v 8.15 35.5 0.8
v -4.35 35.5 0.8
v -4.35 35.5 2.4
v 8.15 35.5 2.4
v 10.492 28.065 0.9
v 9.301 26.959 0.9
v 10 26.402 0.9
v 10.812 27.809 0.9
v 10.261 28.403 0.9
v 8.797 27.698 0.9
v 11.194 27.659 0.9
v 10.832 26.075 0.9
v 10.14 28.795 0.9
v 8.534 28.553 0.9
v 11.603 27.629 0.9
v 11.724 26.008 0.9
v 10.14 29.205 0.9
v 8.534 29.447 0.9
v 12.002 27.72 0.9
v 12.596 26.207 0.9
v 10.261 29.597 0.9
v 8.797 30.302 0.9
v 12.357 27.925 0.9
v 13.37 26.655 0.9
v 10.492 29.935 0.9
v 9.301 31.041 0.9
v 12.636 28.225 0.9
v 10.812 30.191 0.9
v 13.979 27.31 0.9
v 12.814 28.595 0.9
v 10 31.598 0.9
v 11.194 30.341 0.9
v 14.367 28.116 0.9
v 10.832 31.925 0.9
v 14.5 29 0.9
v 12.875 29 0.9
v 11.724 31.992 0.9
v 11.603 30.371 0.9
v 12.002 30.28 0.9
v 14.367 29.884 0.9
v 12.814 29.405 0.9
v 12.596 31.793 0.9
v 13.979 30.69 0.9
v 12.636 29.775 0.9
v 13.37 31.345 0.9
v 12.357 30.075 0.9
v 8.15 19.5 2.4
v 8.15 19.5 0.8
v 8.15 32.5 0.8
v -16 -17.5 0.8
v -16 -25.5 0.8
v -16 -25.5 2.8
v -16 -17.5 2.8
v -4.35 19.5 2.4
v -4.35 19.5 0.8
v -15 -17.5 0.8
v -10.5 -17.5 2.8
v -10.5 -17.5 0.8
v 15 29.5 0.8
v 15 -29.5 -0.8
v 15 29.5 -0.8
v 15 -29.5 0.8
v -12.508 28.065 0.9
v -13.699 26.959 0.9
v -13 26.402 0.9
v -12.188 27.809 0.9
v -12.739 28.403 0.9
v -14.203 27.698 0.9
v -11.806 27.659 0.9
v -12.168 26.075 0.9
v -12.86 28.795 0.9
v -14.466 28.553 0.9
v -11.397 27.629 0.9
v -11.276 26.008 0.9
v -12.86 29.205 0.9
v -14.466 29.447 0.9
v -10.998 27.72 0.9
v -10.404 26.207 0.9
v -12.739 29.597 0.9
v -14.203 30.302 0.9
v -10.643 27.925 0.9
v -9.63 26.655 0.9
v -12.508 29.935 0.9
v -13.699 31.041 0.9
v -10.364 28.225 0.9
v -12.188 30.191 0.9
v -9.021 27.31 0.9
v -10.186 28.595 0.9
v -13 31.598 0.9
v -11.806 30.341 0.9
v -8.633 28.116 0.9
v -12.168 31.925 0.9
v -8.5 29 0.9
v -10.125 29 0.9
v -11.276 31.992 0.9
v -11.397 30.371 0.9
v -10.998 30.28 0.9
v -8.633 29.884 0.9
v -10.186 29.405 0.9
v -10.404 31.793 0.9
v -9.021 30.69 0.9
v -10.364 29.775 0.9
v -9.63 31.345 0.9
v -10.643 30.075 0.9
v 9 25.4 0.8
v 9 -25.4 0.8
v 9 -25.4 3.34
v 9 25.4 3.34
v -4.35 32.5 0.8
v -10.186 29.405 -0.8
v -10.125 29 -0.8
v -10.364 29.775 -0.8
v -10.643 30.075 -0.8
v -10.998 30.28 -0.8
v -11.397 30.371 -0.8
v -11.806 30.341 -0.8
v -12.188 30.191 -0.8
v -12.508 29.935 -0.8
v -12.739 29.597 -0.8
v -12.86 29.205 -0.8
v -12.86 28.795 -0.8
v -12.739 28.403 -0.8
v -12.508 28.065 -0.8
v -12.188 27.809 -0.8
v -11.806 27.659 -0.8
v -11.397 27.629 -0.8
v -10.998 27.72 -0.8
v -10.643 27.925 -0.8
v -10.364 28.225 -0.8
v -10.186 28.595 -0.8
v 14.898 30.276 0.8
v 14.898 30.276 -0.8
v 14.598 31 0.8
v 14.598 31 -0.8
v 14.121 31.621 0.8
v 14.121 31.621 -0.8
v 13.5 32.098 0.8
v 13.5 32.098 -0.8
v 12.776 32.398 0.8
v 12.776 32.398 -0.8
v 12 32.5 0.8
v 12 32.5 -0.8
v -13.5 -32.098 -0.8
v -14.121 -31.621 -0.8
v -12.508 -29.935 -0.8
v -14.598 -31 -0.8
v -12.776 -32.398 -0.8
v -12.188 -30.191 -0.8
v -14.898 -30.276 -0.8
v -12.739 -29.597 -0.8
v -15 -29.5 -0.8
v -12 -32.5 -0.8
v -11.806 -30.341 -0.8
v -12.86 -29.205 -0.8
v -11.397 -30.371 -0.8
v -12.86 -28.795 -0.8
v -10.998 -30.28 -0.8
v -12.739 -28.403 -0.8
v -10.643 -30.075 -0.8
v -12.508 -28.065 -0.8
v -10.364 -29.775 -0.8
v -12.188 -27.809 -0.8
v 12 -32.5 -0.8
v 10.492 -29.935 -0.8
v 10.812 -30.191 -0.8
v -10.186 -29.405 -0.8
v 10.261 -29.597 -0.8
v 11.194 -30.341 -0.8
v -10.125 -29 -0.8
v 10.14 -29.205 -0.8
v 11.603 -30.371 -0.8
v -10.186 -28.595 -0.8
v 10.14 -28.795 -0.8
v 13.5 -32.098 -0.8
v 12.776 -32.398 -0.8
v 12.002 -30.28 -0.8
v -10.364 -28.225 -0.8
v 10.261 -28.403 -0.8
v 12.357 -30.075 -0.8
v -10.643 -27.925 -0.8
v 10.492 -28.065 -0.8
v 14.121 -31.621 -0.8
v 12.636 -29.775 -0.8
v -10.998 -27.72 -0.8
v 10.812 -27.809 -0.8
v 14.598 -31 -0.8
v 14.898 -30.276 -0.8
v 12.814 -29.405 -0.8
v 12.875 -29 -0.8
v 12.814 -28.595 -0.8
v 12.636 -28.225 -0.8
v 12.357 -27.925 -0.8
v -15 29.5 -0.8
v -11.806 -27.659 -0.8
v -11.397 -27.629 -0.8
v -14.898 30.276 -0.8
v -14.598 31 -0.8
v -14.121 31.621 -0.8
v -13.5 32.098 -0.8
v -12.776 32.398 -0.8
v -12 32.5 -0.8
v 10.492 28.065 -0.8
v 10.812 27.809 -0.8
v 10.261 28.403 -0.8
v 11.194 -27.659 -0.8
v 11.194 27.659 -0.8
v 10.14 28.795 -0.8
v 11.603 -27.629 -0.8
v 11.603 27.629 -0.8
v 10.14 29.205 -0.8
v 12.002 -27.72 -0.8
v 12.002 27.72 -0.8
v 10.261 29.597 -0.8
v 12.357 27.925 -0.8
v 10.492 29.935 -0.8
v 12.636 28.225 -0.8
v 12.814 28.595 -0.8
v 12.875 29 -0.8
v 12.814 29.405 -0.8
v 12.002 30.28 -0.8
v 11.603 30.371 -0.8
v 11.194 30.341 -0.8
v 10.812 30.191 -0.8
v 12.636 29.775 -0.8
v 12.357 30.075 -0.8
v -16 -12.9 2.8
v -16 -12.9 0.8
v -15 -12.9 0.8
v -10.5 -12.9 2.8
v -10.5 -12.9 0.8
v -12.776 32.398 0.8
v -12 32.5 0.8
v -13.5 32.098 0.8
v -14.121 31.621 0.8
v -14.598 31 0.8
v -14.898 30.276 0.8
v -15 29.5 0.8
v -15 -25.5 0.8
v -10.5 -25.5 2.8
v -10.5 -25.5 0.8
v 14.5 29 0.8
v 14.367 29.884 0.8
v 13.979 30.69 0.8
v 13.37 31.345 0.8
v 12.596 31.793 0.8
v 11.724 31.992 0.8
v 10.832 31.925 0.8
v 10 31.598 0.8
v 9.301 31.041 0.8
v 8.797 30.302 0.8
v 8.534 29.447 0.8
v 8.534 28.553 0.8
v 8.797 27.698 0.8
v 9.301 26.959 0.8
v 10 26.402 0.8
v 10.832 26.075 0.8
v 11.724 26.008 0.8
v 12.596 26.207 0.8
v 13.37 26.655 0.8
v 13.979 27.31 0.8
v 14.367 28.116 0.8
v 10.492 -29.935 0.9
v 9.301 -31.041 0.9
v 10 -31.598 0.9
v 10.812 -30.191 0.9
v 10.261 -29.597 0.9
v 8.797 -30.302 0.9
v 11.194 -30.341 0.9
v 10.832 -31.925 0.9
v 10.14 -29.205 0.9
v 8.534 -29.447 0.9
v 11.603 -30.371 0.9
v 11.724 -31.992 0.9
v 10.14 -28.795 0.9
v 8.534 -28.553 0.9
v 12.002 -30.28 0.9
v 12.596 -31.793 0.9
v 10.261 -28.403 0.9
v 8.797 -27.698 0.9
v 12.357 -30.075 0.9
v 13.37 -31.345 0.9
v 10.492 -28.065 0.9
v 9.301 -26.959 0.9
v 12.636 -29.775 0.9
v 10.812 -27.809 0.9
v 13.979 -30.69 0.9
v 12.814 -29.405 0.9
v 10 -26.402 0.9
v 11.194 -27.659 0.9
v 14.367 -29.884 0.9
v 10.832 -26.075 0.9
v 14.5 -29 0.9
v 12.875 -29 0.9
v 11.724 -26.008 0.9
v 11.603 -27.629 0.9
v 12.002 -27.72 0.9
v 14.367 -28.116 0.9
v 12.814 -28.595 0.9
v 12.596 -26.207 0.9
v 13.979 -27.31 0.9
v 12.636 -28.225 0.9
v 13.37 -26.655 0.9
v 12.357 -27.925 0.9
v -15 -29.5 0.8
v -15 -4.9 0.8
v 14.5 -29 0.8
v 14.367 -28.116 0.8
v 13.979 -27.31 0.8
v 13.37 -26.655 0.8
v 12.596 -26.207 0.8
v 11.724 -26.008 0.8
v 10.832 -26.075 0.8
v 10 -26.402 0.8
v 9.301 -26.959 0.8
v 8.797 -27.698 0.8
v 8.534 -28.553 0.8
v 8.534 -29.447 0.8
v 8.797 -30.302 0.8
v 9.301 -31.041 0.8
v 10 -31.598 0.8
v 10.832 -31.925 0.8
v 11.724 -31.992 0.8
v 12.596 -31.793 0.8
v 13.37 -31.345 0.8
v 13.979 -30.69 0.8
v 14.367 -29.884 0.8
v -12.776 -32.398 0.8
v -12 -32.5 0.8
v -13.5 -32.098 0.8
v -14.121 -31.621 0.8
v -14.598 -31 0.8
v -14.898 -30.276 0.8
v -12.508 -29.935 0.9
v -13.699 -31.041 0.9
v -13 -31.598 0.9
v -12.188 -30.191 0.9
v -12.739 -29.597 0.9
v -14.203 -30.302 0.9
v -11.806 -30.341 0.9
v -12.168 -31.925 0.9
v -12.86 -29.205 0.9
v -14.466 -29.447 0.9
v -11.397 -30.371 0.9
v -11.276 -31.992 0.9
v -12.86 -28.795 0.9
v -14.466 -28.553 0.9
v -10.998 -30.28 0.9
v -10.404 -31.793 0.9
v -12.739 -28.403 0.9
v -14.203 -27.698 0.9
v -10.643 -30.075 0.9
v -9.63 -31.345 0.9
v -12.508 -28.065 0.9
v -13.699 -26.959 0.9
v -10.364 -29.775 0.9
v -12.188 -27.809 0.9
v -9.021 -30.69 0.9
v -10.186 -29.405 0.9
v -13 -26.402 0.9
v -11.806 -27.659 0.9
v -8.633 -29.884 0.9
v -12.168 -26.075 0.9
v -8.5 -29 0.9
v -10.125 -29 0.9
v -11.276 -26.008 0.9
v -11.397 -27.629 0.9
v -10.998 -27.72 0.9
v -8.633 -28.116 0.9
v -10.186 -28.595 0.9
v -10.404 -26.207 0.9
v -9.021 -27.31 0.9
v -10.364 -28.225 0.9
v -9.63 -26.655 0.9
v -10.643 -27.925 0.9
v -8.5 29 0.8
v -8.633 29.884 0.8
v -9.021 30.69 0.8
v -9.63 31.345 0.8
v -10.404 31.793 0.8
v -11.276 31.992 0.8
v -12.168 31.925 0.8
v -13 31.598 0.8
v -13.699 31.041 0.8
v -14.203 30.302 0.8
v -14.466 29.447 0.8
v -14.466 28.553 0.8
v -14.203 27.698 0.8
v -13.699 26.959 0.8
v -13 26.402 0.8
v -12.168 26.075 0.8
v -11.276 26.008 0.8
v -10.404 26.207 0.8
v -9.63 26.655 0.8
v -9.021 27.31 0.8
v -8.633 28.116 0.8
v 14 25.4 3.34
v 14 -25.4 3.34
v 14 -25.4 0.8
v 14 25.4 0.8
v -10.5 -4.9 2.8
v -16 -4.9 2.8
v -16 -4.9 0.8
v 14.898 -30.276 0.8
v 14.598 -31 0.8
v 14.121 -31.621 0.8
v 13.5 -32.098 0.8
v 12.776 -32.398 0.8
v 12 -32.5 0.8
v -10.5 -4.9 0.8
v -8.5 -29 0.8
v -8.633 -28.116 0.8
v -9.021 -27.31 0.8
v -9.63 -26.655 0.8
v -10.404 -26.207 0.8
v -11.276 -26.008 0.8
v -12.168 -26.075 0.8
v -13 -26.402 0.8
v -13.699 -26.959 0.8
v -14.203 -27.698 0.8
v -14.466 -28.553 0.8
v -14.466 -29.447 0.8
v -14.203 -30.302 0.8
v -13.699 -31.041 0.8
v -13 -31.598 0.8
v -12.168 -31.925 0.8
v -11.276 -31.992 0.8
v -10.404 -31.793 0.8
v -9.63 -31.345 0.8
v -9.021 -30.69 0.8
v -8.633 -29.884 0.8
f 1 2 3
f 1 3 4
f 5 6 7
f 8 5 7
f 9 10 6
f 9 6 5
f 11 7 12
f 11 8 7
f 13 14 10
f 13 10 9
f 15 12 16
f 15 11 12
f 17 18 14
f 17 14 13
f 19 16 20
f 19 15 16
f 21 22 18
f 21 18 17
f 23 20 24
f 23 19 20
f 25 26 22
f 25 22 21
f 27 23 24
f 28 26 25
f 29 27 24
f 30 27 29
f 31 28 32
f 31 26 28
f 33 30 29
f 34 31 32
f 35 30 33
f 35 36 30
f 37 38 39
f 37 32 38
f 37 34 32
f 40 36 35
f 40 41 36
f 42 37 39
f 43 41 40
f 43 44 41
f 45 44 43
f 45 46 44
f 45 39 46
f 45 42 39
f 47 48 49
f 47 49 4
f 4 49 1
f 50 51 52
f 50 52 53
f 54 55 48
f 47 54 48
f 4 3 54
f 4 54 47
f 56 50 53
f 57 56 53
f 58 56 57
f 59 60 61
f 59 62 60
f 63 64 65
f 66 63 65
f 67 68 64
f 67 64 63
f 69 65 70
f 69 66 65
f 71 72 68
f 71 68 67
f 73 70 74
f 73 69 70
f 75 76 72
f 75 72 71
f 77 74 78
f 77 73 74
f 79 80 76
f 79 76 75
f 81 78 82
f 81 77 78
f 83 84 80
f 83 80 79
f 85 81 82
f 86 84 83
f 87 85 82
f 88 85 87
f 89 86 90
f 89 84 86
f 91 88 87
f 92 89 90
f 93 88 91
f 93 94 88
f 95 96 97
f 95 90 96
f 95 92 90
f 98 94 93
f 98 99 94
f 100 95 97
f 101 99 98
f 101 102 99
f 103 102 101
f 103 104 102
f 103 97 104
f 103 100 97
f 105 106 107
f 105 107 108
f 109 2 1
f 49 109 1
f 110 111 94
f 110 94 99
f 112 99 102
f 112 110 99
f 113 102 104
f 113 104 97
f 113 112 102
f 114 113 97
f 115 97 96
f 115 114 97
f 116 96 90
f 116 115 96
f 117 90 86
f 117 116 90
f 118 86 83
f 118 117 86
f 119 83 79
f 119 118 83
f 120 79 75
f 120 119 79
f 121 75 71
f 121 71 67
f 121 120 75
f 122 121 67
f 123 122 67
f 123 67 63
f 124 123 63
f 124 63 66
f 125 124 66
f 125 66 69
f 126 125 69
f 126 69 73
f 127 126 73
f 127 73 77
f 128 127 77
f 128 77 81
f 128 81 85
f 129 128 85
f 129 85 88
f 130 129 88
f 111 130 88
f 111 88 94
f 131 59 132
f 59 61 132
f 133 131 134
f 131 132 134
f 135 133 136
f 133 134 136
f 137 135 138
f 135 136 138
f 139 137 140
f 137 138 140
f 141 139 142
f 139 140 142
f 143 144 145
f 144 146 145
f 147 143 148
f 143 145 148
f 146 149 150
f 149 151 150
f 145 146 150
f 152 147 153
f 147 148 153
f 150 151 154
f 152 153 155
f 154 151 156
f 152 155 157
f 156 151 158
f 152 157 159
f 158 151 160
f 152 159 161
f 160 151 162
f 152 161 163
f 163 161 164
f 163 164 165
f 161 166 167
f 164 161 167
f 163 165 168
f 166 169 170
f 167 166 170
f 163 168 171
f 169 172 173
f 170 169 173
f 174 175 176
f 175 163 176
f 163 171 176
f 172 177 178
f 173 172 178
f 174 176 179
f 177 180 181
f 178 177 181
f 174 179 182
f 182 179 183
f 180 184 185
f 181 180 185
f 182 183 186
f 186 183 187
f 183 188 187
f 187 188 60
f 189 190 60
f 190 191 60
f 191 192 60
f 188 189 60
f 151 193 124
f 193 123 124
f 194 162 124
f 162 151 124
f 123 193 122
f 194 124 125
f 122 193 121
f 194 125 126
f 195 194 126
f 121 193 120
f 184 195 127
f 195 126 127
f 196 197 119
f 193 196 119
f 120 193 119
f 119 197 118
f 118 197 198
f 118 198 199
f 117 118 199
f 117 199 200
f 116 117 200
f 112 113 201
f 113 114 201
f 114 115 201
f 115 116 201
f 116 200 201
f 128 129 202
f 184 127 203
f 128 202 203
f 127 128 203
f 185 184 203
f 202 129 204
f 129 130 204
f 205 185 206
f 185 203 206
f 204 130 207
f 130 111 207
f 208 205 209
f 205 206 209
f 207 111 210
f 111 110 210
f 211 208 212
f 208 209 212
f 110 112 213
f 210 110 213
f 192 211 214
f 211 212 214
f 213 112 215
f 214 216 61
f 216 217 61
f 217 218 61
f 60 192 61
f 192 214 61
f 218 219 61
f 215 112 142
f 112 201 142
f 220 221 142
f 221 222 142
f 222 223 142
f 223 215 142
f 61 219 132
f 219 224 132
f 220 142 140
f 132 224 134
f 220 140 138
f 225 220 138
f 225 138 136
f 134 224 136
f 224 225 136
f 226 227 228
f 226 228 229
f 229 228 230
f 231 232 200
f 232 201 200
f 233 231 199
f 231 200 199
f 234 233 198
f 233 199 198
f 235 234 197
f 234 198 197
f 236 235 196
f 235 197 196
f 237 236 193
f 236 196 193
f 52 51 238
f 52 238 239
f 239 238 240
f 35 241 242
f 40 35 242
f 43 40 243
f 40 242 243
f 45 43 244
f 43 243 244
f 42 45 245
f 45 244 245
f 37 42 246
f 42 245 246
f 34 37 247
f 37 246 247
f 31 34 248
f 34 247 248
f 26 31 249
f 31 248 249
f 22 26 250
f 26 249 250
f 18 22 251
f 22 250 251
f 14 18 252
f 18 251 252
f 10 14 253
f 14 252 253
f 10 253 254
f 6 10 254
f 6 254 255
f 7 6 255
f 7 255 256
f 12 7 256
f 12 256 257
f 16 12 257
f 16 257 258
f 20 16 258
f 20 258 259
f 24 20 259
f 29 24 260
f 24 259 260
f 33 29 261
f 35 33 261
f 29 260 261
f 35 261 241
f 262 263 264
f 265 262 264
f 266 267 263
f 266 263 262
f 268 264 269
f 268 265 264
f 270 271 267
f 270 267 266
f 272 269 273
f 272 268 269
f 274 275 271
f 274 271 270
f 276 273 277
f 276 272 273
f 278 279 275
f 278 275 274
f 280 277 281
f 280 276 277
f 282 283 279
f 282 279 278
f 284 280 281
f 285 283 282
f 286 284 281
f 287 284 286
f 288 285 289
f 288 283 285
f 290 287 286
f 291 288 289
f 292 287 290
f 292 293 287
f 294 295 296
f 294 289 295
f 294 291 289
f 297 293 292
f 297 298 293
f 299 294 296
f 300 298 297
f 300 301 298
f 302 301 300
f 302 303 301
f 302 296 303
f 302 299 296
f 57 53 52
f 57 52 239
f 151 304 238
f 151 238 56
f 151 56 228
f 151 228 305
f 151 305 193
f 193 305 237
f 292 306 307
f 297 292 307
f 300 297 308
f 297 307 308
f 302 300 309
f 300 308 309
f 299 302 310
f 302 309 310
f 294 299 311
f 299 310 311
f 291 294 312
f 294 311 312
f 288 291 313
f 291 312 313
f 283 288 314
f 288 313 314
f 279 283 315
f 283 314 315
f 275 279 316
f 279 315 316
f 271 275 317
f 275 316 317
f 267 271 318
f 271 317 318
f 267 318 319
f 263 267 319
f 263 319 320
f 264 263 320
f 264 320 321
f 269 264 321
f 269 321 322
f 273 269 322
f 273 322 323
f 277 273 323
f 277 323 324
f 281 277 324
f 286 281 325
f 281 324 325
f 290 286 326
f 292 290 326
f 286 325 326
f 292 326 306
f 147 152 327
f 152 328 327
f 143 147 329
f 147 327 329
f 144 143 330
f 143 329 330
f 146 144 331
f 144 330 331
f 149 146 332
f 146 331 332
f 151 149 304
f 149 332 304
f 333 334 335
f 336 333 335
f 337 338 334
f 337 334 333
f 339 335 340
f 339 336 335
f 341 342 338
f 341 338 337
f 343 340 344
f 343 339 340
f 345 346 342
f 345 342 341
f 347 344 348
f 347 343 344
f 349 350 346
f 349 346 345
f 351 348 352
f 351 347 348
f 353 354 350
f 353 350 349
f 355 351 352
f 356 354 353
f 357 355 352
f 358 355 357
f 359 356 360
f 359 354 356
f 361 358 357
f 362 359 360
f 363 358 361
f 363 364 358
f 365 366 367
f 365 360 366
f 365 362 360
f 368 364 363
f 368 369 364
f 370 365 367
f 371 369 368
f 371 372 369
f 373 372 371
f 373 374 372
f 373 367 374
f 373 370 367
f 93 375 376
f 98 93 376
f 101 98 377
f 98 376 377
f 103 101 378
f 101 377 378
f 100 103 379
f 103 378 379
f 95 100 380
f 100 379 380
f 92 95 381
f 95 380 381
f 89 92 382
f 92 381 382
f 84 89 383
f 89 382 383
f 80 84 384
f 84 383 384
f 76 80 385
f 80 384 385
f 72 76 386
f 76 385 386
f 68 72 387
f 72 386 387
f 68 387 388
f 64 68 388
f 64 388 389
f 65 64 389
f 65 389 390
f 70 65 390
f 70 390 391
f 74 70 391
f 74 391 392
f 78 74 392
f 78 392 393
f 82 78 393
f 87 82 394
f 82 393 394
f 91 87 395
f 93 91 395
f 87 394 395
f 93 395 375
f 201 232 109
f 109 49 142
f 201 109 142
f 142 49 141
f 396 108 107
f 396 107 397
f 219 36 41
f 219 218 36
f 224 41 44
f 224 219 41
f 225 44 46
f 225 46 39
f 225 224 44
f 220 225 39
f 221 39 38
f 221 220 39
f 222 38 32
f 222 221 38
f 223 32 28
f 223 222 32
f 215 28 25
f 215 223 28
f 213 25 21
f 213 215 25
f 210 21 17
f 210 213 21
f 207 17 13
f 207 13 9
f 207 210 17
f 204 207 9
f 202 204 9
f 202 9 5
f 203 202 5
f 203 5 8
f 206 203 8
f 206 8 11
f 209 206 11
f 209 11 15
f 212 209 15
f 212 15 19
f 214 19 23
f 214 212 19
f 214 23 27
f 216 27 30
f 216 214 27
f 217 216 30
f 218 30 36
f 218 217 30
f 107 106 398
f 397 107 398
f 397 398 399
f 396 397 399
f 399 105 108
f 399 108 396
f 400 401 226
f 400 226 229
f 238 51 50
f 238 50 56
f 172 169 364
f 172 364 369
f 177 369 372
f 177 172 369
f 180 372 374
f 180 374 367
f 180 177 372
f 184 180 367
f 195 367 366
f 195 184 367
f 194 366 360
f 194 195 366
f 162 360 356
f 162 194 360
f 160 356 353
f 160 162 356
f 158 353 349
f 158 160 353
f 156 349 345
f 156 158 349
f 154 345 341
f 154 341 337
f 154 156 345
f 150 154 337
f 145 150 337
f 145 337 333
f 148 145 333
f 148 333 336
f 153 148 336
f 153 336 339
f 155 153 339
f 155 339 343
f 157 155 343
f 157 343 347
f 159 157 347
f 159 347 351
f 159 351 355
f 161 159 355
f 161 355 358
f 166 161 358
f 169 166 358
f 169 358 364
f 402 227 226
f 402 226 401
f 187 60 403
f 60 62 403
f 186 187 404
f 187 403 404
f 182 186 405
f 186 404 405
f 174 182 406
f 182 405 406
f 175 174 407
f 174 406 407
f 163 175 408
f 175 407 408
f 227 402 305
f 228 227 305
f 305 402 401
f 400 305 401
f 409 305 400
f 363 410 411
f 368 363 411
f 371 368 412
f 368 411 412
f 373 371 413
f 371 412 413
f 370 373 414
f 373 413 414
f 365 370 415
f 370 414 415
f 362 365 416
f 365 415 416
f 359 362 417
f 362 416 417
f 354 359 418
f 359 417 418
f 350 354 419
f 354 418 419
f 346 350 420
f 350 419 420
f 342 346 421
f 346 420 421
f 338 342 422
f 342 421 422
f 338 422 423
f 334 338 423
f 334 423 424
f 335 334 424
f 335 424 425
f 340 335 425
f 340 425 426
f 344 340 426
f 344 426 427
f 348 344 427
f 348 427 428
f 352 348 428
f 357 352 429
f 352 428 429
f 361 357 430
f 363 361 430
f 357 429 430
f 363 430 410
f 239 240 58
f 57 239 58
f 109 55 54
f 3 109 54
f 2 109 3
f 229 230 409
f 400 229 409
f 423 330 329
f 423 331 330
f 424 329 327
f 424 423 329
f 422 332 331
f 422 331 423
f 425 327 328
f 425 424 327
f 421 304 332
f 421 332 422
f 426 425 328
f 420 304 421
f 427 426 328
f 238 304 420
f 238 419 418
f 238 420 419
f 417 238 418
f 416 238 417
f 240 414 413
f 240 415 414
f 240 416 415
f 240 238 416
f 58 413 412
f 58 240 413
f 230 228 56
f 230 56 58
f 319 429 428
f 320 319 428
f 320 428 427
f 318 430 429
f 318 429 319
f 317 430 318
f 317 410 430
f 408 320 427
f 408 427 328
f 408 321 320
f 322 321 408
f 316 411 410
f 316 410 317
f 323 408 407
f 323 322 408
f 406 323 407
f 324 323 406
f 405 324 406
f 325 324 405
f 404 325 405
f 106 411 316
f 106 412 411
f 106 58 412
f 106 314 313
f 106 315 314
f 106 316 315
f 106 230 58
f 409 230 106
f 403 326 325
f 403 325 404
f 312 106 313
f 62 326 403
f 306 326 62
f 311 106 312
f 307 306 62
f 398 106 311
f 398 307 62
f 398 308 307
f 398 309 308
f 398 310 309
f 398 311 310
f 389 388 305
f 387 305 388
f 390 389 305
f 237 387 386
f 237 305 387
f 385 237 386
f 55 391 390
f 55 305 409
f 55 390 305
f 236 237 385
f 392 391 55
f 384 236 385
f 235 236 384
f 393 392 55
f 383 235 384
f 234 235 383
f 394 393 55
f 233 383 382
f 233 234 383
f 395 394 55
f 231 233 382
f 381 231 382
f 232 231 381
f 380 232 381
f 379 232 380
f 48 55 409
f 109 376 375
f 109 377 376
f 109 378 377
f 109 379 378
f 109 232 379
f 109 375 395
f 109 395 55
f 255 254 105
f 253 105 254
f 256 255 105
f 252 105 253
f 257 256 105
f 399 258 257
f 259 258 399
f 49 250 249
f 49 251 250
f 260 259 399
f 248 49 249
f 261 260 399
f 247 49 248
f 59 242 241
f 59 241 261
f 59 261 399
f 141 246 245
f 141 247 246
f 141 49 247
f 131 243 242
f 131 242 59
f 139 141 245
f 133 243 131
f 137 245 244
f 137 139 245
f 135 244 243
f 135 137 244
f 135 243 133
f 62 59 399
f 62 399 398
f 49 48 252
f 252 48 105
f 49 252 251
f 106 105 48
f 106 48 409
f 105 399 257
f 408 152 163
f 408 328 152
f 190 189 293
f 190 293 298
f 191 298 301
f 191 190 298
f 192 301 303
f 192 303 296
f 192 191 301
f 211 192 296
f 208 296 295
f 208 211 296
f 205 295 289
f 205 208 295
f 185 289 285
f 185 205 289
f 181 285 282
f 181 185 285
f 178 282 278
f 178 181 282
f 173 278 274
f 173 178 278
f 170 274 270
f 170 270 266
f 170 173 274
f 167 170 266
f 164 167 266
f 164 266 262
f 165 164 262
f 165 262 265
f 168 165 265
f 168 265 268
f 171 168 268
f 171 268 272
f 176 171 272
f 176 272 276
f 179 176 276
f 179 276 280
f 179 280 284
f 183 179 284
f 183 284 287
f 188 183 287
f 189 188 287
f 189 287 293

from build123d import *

# Parameters (mm, degrees)
SKETCH1_W           = 30
SKETCH1_H           = 65
SKETCH1_R           = 1.375
BOSS_EXTRUDE1_DEPTH = 0.8
SKETCH4_R           = 3
SKETCH4_R_2         = 1.375
EXTRUDE_THIN1_DEPTH = 0.1
FILLET1_R           = 3
SKETCH2_W           = 12.5
SKETCH2_H           = 16
BOSS_EXTRUDE2_DEPTH = 1.6
SKETCH3_W           = 5
SKETCH3_H           = 50.8
BOSS_EXTRUDE3_DEPTH = 2.54
SKETCH5_W           = 5.5
SKETCH5_H           = 8
BOSS_EXTRUDE4_DEPTH = 2


with BuildPart() as part:
    # Sketch1 → Boss-Extrude1 (new, symmetric)
    with BuildSketch(Plane.XY):
        Rectangle(SKETCH1_W, SKETCH1_H)
        with Locations((11.5, -29)):
            Circle(SKETCH1_R, mode=Mode.SUBTRACT)
        with Locations((-11.5, -29)):
            Circle(SKETCH1_R, mode=Mode.SUBTRACT)
        with Locations((11.5, 29)):
            Circle(SKETCH1_R, mode=Mode.SUBTRACT)
        with Locations((-11.5, 29)):
            Circle(SKETCH1_R, mode=Mode.SUBTRACT)
    extrude(amount=BOSS_EXTRUDE1_DEPTH, both=True)

    # Sketch4 → Extrude-Thin1 (add)
    # profile 1 of 4: a face of its own
    with BuildSketch(Plane.XY.offset(0.8)):
        with Locations((11.5, 29)):
            Circle(SKETCH4_R)
        with Locations((11.5, 29)):
            Circle(SKETCH4_R_2, mode=Mode.SUBTRACT)
    # profile 2 of 4: a face of its own
    with BuildSketch(Plane.XY.offset(0.8)):
        with Locations((11.5, -29)):
            Circle(SKETCH4_R)
        with Locations((11.5, -29)):
            Circle(SKETCH4_R_2, mode=Mode.SUBTRACT)
    # profile 3 of 4: a face of its own
    with BuildSketch(Plane.XY.offset(0.8)):
        with Locations((-11.5, -29)):
            Circle(SKETCH4_R)
        with Locations((-11.5, -29)):
            Circle(SKETCH4_R_2, mode=Mode.SUBTRACT)
    # profile 4 of 4: a face of its own
    with BuildSketch(Plane.XY.offset(0.8)):
        with Locations((-11.5, 29)):
            Circle(SKETCH4_R)
        with Locations((-11.5, 29)):
            Circle(SKETCH4_R_2, mode=Mode.SUBTRACT)
    extrude(amount=EXTRUDE_THIN1_DEPTH)

    # Fillet1
    fillet1_edges = [part.edges().sort_by_distance(p)[0] for p in [
        (-15, -32.5, 0),
        (-15, 32.5, 0),
        (15, 32.5, 0),
        (15, -32.5, 0),
    ]]
    fillet(fillet1_edges, radius=FILLET1_R)

    # Sketch2 → Boss-Extrude2 (add)
    with BuildSketch(Plane.XY.offset(0.8)):
        with Locations((1.9, 27.5)):
            Rectangle(SKETCH2_W, SKETCH2_H)
    extrude(amount=BOSS_EXTRUDE2_DEPTH)

    # Sketch3 → Boss-Extrude3 (add)
    with BuildSketch(Plane.XY.offset(0.8)):
        with Locations((11.5, 0)):
            Rectangle(SKETCH3_W, SKETCH3_H)
    extrude(amount=BOSS_EXTRUDE3_DEPTH)

    # Sketch5 → Boss-Extrude4 (add)
    with BuildSketch(Plane.XY.offset(0.8)):
        with Locations((-13.25, -21.5)):
            Rectangle(SKETCH5_W, SKETCH5_H)
        with Locations((-13.25, -8.9)):
            Rectangle(SKETCH5_W, SKETCH5_H)
    extrude(amount=BOSS_EXTRUDE4_DEPTH)


solid = part.part
